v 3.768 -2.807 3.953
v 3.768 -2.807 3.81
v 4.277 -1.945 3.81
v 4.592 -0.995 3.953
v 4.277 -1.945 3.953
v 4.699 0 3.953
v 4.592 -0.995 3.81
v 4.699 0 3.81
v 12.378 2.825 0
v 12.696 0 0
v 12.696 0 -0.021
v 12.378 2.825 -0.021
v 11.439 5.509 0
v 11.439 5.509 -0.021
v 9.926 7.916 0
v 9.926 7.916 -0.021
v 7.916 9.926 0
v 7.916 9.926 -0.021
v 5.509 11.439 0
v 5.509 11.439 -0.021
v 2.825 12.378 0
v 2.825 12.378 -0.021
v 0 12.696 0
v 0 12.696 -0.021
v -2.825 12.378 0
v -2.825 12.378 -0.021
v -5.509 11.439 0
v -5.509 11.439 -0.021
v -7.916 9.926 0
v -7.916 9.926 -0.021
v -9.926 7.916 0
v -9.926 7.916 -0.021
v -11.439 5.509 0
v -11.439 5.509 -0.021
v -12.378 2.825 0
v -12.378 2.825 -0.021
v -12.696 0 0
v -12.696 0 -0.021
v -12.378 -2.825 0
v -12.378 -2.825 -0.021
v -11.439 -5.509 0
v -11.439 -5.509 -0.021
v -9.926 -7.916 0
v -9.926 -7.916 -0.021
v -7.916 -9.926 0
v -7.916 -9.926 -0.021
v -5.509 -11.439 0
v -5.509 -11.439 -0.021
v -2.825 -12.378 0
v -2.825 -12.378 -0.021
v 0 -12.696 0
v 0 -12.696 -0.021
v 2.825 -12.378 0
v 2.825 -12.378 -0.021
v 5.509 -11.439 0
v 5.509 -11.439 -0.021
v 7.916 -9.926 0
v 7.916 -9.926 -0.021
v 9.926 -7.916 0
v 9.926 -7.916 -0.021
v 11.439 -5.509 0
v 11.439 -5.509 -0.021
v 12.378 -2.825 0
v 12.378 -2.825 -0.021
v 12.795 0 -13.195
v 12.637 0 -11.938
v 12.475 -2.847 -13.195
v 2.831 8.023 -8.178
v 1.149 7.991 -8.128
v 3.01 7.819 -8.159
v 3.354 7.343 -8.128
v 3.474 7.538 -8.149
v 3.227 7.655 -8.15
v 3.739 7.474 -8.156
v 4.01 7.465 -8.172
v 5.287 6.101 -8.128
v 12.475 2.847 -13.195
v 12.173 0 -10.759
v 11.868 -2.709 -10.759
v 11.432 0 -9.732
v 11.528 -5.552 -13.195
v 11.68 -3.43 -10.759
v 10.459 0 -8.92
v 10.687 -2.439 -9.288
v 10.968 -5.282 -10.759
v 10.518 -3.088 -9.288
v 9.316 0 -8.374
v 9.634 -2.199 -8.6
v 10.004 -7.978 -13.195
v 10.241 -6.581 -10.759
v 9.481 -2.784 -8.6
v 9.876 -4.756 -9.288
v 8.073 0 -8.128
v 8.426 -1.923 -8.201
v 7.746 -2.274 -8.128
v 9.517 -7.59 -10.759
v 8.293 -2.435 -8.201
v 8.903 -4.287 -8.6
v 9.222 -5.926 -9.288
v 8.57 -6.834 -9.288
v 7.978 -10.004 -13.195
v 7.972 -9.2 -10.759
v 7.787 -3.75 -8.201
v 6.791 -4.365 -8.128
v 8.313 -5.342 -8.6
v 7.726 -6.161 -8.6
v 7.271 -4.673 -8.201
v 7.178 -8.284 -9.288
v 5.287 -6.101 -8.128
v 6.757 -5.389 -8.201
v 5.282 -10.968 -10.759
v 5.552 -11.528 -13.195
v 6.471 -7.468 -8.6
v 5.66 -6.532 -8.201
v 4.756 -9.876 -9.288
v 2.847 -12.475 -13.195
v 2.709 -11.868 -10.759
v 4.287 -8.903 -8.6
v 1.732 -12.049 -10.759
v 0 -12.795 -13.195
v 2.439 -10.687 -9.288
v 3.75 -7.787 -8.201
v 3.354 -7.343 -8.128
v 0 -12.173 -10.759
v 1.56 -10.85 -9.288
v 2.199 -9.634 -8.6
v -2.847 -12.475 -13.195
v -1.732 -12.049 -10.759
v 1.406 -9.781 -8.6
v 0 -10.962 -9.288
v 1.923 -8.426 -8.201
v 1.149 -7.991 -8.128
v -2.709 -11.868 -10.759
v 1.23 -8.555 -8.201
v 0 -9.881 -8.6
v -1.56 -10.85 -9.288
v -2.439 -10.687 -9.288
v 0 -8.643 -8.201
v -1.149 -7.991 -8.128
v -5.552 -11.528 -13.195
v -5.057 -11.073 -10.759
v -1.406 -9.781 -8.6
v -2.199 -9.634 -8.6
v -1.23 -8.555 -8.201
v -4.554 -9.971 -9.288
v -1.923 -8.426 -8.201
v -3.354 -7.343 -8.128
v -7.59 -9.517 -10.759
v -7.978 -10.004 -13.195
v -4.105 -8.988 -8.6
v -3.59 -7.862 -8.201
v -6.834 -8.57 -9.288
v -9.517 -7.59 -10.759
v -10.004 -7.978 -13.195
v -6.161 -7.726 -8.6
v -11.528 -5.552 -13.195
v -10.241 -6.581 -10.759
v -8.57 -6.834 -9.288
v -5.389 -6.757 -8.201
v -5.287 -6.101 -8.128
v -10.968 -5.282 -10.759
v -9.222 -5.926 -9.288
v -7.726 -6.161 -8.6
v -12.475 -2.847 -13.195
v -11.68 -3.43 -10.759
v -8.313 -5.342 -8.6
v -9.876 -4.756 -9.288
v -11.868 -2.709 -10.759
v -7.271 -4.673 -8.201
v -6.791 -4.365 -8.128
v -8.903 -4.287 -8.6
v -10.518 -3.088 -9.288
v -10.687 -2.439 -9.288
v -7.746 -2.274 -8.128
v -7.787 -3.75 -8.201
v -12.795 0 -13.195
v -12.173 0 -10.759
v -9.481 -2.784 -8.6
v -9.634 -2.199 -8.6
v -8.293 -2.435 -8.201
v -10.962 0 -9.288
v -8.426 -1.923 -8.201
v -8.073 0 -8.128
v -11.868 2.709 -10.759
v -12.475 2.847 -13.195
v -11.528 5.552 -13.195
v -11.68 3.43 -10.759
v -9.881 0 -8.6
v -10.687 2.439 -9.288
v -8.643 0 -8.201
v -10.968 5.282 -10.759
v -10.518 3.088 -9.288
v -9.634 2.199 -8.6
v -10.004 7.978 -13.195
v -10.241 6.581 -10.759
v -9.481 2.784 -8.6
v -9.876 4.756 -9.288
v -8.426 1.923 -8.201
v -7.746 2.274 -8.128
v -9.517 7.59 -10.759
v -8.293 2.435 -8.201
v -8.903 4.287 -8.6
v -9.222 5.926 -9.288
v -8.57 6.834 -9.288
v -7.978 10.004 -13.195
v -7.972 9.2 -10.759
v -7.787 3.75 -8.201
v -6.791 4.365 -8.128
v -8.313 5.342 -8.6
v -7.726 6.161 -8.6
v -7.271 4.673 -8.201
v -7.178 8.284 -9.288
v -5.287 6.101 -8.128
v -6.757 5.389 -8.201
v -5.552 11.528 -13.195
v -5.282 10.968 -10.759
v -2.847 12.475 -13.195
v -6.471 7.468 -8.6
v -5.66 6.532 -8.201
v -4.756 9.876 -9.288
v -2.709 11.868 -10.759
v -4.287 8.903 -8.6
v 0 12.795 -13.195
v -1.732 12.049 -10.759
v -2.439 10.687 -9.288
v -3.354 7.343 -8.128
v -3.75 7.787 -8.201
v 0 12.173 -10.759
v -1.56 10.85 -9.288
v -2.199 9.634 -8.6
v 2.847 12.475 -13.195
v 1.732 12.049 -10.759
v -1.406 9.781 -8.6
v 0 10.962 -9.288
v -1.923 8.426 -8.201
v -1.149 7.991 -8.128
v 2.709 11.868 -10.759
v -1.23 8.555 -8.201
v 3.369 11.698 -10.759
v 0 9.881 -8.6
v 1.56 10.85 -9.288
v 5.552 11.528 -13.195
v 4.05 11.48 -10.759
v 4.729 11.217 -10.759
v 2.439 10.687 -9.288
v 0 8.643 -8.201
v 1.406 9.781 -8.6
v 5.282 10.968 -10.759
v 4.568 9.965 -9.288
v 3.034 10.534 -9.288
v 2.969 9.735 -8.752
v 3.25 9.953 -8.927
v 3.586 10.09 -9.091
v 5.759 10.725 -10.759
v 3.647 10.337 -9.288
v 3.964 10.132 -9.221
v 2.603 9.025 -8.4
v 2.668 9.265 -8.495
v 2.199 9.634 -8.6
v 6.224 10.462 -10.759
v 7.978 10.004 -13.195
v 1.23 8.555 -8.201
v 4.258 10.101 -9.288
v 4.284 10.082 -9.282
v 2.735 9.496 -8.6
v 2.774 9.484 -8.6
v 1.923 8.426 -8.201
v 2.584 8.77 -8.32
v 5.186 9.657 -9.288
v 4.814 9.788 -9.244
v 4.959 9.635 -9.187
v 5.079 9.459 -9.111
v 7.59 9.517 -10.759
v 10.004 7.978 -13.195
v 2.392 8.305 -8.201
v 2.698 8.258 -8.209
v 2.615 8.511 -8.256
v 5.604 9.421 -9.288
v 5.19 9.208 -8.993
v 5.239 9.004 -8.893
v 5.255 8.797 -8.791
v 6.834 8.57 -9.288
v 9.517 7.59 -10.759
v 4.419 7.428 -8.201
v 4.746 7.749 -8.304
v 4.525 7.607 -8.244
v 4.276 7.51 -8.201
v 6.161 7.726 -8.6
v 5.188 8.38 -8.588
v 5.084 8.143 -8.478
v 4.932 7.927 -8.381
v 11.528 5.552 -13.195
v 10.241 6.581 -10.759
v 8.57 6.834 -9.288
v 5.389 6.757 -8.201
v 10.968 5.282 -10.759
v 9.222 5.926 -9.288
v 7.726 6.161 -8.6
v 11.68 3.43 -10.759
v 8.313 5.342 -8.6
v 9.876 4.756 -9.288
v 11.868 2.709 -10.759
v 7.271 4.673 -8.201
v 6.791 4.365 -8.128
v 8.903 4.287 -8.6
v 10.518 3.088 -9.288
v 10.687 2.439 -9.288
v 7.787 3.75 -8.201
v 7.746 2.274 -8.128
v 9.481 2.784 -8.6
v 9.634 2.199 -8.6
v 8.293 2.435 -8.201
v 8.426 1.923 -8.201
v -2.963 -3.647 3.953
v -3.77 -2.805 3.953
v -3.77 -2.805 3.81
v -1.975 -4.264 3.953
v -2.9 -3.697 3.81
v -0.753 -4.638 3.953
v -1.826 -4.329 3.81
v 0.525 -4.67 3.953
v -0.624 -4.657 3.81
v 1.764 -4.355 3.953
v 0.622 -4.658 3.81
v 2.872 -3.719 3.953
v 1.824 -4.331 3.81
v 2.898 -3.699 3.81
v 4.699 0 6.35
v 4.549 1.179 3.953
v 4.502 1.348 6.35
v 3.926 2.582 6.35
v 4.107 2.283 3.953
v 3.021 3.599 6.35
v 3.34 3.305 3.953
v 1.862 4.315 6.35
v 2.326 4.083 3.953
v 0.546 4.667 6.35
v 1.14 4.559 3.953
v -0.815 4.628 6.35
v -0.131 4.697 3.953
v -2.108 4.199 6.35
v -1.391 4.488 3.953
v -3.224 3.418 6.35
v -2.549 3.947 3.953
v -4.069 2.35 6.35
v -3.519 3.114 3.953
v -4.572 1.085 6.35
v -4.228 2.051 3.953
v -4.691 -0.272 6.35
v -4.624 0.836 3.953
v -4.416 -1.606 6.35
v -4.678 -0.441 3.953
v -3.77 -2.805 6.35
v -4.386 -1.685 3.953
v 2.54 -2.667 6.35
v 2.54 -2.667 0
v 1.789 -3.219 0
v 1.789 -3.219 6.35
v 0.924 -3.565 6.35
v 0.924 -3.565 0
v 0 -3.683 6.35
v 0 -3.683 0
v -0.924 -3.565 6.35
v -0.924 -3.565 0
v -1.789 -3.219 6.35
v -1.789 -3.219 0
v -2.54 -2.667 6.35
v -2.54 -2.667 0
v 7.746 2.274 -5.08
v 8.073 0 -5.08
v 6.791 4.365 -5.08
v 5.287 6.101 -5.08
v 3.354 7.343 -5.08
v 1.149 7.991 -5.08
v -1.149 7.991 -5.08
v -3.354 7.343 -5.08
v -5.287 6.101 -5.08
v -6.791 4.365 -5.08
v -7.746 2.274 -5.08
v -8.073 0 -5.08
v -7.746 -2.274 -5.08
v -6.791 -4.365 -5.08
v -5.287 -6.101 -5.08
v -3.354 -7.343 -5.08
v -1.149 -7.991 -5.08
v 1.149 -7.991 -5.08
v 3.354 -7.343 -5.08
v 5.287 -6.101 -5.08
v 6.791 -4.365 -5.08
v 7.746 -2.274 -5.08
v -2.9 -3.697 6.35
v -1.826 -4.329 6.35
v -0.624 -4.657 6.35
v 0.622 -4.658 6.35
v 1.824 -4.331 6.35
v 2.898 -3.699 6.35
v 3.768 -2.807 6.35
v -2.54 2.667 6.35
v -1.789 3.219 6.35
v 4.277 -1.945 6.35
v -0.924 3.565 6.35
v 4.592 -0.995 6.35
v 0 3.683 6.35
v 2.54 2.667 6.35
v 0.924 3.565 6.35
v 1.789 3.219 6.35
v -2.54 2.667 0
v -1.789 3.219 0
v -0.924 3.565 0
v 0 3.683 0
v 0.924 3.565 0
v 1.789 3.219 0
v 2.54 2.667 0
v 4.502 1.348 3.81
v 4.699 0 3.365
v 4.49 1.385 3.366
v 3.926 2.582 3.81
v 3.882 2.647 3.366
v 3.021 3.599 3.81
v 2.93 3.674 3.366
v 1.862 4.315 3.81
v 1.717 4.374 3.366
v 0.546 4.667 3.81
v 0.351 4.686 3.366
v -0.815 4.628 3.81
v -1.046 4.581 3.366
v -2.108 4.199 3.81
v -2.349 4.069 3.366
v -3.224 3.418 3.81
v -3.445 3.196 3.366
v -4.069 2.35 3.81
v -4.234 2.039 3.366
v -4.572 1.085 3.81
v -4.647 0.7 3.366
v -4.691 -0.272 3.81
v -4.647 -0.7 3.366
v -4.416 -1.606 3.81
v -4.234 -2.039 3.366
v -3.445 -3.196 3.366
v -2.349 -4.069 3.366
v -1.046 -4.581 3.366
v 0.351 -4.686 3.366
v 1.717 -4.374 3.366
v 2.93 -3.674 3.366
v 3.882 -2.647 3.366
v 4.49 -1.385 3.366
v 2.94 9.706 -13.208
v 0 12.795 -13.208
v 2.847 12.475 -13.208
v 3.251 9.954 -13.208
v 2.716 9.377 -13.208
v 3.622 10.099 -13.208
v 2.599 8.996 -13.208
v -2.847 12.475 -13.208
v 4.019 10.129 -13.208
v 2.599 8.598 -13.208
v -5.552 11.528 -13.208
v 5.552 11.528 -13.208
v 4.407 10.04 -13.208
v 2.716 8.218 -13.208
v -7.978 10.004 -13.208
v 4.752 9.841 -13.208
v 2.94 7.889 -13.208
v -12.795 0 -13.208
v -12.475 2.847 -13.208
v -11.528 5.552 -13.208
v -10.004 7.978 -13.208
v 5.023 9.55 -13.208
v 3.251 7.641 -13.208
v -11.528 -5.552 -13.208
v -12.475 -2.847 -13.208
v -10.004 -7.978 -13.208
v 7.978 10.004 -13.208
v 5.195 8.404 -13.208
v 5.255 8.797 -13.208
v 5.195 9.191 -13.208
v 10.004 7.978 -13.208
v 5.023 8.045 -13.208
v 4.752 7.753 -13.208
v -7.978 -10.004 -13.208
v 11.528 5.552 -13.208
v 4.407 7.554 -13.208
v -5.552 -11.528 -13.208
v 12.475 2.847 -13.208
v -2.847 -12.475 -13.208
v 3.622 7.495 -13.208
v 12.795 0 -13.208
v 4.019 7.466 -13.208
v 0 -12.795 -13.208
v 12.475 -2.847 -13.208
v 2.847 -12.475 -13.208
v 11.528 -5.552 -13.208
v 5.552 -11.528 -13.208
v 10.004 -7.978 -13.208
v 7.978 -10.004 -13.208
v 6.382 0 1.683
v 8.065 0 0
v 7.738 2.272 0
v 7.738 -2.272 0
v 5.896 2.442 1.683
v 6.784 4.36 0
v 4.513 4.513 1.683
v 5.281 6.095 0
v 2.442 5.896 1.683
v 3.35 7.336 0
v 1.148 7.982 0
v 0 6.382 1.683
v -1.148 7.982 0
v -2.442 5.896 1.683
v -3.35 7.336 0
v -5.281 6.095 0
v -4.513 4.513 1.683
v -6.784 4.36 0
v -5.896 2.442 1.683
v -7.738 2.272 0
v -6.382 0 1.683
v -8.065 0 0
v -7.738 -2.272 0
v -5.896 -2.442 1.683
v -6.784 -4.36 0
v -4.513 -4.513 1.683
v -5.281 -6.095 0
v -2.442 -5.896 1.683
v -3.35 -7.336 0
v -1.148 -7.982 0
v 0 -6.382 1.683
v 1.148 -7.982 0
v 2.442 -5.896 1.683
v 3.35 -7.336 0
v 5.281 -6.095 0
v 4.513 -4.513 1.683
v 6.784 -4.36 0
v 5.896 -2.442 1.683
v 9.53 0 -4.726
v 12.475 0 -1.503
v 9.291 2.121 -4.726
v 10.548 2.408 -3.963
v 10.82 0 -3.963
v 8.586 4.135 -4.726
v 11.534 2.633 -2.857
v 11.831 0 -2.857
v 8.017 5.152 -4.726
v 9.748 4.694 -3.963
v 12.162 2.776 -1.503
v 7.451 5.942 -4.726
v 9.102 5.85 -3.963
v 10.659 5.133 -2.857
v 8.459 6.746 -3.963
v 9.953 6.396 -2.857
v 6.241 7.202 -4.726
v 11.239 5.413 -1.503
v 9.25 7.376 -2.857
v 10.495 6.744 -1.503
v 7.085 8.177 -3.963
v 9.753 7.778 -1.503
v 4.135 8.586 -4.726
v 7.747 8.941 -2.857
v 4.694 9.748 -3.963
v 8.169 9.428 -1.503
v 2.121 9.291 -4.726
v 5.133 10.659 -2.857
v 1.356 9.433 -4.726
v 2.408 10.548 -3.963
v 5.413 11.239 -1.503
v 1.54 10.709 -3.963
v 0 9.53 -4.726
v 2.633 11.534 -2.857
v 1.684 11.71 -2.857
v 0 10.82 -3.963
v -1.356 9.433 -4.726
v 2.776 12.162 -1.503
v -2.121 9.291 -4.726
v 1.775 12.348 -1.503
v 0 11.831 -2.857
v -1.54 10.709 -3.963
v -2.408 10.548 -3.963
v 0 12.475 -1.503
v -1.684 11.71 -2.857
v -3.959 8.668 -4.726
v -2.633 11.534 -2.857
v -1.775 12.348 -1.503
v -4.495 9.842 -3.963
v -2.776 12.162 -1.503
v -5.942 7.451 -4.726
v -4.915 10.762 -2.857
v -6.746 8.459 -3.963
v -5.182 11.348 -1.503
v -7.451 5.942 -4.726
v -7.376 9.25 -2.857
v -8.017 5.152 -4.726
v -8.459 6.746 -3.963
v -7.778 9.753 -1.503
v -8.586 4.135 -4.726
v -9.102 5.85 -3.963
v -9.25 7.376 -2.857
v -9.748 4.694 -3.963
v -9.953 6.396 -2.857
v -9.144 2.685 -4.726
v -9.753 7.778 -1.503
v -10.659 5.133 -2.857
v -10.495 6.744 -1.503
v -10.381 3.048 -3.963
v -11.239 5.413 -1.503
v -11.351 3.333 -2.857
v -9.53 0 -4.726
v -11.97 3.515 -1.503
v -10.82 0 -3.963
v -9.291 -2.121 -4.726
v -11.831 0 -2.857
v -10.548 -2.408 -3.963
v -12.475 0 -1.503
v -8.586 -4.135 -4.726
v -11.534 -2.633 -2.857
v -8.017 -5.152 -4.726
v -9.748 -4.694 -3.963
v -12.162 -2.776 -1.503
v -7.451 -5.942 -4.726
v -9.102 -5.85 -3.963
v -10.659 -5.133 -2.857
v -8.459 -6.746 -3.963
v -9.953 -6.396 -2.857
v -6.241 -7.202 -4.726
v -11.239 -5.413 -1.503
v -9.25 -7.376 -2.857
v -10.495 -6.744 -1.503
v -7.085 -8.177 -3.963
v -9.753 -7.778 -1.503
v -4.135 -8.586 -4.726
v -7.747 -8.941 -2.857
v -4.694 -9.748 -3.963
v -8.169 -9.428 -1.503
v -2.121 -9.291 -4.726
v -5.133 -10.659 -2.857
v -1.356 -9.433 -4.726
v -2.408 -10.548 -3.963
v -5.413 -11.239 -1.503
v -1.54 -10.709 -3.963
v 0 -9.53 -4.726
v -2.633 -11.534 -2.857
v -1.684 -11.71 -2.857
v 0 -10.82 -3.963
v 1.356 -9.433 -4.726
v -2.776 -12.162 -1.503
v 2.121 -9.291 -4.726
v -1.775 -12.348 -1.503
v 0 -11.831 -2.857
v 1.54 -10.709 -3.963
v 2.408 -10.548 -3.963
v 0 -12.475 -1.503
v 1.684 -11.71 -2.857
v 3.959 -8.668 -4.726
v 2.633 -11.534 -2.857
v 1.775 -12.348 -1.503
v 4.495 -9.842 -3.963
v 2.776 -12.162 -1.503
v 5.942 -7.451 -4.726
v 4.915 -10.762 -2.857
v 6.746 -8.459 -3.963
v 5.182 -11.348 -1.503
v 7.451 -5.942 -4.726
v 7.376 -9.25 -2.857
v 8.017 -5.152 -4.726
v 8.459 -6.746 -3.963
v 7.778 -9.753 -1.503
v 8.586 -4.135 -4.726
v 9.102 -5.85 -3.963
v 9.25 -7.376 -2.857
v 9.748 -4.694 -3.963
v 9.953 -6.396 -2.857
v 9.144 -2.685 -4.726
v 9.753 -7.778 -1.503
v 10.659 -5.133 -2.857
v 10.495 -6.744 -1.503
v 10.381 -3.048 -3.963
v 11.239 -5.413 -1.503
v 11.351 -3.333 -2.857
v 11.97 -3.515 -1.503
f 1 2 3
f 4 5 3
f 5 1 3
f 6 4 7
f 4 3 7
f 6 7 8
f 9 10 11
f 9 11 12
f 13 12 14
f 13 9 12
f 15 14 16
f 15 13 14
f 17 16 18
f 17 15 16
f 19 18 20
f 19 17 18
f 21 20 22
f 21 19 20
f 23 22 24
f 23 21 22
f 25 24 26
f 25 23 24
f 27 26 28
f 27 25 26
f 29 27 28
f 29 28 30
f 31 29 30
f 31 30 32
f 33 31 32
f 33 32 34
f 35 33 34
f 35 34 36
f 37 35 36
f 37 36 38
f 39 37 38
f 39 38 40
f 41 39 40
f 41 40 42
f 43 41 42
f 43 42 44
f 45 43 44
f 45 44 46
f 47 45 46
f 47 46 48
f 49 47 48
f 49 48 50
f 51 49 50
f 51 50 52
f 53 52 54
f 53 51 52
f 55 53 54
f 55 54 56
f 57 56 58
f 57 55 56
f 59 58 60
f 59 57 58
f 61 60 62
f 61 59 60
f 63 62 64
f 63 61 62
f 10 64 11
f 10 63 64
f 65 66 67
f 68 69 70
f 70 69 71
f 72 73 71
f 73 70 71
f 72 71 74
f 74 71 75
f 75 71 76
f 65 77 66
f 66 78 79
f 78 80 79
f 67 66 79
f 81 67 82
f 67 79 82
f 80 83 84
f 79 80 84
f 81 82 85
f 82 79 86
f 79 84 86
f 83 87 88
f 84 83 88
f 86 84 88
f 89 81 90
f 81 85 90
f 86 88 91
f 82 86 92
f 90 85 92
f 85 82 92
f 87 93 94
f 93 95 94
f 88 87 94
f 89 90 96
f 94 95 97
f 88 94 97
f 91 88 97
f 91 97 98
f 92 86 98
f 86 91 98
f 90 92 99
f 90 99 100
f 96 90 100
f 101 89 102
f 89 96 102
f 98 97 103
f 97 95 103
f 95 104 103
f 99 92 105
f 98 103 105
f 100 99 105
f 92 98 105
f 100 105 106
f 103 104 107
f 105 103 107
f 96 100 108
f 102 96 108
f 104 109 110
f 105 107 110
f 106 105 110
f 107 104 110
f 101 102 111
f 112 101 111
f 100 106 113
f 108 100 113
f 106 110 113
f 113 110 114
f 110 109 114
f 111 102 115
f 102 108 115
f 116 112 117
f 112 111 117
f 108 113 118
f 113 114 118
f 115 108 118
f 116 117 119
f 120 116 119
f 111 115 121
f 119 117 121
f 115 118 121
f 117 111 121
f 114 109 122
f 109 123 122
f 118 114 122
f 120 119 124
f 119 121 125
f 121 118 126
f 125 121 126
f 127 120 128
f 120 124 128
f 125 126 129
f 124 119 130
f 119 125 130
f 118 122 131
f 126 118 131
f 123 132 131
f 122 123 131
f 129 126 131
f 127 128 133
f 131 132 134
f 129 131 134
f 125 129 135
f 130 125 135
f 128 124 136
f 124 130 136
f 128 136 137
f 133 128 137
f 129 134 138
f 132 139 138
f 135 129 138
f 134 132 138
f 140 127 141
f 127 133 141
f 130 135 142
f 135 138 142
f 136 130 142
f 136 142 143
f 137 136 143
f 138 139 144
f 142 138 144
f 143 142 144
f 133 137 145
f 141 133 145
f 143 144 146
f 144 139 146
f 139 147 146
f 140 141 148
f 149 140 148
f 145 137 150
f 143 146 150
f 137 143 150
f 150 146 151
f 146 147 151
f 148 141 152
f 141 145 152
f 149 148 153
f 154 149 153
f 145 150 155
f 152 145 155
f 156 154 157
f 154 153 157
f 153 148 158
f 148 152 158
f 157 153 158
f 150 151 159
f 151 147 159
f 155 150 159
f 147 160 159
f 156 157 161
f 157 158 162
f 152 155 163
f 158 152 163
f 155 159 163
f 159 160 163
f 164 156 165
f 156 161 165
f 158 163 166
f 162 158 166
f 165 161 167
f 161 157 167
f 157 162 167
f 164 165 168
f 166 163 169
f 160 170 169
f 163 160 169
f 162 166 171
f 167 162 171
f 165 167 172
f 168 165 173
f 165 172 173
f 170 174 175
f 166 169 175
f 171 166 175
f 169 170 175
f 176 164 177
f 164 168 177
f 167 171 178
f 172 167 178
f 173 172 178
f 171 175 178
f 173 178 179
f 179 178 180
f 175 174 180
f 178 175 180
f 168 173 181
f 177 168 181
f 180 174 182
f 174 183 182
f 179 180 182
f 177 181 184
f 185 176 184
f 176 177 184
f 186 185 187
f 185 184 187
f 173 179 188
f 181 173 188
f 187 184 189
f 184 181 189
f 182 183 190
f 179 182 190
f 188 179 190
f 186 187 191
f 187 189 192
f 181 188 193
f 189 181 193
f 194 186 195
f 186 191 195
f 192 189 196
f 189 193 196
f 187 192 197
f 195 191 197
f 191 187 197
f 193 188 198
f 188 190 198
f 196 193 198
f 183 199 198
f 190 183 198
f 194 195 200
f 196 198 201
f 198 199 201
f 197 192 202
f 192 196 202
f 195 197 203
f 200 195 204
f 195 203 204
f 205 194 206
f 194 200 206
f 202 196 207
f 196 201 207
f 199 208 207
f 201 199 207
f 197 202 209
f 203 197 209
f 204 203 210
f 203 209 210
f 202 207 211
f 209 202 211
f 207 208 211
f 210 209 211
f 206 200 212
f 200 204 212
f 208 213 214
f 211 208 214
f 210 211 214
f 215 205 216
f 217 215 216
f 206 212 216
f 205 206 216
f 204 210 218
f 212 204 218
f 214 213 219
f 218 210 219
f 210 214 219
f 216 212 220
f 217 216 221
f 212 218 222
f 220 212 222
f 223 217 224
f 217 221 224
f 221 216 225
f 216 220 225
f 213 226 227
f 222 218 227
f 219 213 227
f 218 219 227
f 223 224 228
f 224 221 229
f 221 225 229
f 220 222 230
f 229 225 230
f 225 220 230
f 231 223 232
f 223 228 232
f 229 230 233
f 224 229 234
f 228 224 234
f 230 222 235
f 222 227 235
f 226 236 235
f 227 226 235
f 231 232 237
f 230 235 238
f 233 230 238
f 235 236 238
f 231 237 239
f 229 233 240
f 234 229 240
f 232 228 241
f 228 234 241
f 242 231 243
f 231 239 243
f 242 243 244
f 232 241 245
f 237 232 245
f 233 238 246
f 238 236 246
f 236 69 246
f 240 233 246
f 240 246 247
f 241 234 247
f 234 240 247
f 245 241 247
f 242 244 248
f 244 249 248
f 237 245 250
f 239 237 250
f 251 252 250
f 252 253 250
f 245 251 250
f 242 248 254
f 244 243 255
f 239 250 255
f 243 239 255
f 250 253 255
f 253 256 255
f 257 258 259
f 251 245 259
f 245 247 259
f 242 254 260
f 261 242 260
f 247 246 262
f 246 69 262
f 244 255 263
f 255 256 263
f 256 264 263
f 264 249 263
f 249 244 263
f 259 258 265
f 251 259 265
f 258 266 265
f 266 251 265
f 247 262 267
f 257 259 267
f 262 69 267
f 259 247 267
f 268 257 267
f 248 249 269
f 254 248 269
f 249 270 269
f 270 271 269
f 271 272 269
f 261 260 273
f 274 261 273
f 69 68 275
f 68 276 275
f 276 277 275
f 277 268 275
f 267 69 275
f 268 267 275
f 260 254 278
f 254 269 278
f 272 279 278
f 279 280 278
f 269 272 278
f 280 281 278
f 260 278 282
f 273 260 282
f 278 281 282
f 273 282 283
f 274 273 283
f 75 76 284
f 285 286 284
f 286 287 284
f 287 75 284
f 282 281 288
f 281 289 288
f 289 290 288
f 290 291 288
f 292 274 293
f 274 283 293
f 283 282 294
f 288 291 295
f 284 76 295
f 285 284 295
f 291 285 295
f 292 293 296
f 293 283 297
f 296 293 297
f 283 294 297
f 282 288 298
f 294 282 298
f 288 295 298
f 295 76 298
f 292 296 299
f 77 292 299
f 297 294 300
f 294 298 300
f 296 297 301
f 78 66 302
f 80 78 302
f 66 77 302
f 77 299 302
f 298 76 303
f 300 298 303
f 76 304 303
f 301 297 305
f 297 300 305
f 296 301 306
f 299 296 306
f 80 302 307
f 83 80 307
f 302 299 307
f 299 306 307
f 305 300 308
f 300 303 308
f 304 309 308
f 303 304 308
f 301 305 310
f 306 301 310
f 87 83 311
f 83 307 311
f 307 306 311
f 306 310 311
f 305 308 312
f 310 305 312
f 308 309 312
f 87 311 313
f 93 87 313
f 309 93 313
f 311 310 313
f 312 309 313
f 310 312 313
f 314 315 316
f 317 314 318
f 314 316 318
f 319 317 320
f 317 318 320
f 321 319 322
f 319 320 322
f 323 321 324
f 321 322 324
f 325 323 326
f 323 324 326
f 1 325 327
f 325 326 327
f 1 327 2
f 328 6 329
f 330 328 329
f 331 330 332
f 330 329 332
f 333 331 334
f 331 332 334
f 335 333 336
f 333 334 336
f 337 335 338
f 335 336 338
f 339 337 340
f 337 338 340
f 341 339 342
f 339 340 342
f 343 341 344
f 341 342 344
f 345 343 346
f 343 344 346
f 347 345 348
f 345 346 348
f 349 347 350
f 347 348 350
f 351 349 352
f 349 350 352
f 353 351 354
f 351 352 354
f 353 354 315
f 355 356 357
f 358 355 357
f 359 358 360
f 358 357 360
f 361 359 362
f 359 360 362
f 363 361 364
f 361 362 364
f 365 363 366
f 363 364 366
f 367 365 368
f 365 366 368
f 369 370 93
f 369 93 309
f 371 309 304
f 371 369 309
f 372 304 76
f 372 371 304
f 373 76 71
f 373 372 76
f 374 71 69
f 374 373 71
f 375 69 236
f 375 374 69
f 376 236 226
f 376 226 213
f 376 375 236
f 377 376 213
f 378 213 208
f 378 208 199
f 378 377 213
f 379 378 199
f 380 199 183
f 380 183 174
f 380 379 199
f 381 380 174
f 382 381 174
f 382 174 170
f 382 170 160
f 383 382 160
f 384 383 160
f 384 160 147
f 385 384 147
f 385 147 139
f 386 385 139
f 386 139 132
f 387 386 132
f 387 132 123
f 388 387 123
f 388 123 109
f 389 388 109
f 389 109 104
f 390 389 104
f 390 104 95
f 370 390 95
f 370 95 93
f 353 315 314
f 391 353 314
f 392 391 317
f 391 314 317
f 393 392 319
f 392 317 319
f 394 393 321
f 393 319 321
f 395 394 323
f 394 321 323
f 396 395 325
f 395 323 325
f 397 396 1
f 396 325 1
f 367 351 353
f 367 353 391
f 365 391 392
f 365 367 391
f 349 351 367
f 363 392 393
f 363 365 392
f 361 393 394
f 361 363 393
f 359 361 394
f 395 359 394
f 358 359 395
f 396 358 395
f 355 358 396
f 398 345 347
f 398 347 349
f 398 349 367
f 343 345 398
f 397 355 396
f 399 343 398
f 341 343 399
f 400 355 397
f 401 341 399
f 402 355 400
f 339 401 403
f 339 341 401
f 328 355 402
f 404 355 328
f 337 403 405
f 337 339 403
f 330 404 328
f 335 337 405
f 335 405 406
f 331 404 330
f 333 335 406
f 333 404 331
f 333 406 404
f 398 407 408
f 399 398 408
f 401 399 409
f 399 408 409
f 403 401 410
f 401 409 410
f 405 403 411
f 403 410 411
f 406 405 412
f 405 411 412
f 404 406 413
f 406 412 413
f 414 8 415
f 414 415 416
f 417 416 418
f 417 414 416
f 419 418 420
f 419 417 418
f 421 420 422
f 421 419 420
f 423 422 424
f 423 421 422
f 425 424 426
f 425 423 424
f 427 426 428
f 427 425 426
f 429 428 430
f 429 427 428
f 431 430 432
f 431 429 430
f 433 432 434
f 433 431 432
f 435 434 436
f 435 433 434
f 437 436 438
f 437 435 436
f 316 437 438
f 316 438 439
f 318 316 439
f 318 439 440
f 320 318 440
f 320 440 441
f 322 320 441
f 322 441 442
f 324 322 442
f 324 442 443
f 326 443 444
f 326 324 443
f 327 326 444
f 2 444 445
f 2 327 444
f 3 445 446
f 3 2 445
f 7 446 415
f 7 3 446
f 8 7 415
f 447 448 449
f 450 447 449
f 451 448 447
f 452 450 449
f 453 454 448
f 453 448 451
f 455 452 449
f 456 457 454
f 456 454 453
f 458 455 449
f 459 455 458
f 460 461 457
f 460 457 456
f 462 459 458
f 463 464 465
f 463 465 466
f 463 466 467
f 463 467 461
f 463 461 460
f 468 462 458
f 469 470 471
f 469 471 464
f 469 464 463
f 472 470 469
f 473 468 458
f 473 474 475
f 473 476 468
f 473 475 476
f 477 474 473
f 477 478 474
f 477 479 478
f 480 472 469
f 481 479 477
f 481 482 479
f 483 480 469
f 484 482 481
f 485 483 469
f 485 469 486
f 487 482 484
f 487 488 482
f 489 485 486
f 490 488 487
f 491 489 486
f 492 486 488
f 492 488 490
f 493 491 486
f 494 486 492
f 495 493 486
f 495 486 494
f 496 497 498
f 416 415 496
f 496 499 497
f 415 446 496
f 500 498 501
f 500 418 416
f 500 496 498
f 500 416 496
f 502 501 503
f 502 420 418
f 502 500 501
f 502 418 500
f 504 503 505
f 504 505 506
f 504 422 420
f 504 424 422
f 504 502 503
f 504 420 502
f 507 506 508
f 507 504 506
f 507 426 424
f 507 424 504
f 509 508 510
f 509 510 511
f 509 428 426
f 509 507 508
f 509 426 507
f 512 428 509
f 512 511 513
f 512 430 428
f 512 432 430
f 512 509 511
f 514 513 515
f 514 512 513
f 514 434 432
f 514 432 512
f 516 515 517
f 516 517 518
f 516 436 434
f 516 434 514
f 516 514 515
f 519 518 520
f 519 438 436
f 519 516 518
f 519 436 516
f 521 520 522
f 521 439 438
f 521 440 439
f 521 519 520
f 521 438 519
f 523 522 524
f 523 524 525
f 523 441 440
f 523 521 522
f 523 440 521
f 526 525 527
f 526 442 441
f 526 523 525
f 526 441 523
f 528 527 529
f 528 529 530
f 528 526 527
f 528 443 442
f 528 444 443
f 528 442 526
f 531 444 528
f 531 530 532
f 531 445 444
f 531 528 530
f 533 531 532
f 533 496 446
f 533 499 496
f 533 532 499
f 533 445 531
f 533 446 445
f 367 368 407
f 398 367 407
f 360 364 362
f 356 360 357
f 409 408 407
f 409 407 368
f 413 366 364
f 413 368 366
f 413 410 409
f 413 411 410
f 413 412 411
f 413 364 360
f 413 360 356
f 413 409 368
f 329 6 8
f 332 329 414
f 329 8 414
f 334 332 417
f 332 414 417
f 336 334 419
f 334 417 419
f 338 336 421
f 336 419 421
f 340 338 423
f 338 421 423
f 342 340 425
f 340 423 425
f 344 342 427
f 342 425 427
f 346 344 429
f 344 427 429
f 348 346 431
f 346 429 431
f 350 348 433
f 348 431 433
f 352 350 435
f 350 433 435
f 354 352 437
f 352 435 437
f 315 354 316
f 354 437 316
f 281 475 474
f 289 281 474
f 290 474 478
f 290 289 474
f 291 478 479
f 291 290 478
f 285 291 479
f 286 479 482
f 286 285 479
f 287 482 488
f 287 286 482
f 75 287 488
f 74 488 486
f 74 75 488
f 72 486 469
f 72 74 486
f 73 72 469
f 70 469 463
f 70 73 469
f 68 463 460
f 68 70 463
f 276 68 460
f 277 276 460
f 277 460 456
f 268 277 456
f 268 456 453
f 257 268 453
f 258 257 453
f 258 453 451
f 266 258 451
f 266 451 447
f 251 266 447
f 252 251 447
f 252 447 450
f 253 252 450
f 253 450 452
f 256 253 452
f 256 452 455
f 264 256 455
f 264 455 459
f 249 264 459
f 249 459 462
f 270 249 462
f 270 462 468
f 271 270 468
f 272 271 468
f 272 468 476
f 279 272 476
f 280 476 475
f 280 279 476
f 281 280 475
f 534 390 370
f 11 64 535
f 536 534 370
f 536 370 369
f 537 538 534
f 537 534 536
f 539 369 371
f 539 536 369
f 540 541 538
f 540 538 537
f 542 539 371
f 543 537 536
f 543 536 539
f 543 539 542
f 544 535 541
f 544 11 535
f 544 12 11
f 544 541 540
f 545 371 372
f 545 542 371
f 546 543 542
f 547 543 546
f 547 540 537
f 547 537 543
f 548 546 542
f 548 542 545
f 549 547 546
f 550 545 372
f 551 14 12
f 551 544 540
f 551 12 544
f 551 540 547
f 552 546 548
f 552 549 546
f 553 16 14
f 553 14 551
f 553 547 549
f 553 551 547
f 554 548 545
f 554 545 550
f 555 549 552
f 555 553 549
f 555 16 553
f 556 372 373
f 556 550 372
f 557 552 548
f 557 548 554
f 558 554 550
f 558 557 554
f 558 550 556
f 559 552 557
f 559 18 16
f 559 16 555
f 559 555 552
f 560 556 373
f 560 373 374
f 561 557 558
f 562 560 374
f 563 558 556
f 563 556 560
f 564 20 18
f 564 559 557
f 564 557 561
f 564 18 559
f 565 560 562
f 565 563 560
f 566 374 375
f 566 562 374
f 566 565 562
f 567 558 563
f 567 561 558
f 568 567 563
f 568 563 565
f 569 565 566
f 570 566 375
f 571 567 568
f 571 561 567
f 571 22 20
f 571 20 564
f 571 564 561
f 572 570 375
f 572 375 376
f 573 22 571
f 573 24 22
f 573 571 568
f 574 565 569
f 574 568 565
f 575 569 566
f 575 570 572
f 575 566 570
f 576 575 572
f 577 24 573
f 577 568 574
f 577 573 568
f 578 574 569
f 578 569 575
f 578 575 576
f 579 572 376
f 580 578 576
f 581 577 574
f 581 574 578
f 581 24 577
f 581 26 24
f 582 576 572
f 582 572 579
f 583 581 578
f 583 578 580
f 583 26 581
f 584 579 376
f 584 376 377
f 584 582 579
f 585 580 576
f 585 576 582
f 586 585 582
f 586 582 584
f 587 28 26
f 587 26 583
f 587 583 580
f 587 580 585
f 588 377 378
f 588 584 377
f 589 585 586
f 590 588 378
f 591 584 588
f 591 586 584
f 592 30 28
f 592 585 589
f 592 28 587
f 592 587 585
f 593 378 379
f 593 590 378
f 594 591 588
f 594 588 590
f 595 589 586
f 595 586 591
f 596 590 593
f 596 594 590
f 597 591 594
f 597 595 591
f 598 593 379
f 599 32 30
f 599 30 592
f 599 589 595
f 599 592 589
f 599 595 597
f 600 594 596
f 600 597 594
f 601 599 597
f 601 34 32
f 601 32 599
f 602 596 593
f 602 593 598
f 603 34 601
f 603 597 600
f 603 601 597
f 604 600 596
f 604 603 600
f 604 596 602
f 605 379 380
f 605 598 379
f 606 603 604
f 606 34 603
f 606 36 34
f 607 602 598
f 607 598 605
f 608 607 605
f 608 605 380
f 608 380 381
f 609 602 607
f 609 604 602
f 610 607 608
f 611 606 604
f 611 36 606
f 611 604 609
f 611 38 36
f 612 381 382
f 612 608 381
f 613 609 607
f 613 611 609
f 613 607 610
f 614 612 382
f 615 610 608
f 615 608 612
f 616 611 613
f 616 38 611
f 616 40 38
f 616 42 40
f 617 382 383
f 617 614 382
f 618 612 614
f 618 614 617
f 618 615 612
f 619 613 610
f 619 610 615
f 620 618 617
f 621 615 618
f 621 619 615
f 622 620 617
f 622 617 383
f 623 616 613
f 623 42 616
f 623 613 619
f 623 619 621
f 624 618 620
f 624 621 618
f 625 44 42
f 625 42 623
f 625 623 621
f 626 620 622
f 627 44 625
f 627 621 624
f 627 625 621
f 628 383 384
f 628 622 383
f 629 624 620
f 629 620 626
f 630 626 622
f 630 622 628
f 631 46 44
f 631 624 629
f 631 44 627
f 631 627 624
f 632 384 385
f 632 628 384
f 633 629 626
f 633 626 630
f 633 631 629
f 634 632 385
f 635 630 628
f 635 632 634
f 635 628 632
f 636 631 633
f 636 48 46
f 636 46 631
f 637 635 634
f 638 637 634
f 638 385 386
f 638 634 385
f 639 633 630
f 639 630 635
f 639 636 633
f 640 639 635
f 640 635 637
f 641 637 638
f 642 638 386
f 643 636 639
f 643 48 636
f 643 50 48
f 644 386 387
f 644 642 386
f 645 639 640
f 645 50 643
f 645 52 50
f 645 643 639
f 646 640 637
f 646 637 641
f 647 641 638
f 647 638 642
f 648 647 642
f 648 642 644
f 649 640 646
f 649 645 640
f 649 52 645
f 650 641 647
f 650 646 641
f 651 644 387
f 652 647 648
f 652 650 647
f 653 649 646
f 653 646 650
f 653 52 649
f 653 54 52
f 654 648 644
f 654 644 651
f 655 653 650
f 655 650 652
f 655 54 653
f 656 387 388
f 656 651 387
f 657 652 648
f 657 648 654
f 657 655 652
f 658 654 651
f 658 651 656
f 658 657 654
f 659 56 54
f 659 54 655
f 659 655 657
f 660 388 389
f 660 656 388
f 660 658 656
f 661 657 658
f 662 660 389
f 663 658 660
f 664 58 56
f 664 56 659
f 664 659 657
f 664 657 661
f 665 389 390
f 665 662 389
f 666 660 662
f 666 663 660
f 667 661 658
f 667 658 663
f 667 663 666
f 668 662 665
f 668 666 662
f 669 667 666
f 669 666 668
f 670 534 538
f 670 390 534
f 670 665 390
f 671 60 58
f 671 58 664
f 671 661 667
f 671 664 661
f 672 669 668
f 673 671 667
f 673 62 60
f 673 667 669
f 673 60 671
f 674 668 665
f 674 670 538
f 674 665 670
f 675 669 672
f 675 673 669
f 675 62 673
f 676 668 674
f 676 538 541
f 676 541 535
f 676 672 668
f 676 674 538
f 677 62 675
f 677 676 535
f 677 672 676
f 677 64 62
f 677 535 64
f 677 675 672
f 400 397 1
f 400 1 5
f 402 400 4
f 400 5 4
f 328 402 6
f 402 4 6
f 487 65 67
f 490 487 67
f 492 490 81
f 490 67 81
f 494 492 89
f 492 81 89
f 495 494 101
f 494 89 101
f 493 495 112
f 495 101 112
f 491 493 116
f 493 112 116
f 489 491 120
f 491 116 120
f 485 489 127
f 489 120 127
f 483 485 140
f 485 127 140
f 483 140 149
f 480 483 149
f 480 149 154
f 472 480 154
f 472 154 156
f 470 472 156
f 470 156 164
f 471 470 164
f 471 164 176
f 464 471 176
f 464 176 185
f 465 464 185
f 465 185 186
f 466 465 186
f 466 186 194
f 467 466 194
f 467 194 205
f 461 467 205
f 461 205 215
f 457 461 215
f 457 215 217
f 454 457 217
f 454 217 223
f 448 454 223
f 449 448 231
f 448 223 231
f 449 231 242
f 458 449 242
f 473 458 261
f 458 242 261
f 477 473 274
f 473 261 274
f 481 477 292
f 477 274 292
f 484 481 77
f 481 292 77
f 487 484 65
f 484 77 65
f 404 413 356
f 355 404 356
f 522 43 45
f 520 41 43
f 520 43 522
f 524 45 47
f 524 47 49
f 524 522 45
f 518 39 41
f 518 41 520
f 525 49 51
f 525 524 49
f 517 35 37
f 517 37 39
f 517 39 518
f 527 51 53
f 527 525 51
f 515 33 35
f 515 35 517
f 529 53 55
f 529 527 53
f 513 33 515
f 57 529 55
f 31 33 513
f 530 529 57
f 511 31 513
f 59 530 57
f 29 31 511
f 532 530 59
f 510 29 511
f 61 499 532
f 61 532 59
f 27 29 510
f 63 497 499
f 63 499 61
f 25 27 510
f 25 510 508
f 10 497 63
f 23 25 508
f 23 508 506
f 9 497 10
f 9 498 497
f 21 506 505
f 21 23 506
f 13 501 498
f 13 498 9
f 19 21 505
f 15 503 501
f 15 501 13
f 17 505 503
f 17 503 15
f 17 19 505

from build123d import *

# Parameters (mm, degrees)
F1_DEPTH    = 6.35
F2_R        = 12.6960047963
F2_R_2      = 8.0729751922
F3_DEPTH    = 5.08
F4_DEPTH    = 8.128
F5_R        = 12.7953112481
F5_R_2      = 1.3354653725
F5_R_3      = 8.0729751922
F6_DEPTH    = 5.08
F0_R        = 8.0645
F8_DEPTH    = 3.81
F9_S6_R     = 4.699
F9_T7_DEPTH = 39


# Not quite as in the source:
# - a fillet or chamfer that OpenCascade refuses, or shapes differently, is made with other operations: its cross-section is extruded or revolved along the edge and cut away or added


with BuildPart() as f1:
    # F0 (on Top) → F1 (new body)
    with BuildSketch(Plane.XY):
        with BuildLine():
            Line((-2.54, -2.8050532779), (-3.7699173874, -2.8050532779))
            ThreePointArc((-3.7699173874, -2.8050532779), (-0.0014195763, -4.6989997856), (3.7682218762, -2.8073305634))
            Line((3.7682218762, -2.8073305634), (2.54, -2.8073305634))
            Line((2.54, -2.8073305634), (2.54, -2.667))
            ThreePointArc((2.54, -2.667), (0, -3.683), (-2.54, -2.667))
            Line((-2.54, -2.667), (-2.54, -2.8050532779))
        make_face()
        with BuildLine():
            Line((2.54, 0), (2.54, -2.667))
            ThreePointArc((2.54, -2.667), (3.3852111456, -1.4508047767), (3.683, 0))
            ThreePointArc((3.683, 0), (3.3852111456, 1.4508047767), (2.54, 2.667))
            Line((2.54, 2.667), (2.54, 0))
        make_face()
        with BuildLine():
            Line((2.54, -2.8073305634), (3.7682218762, -2.8073305634))
            Line((3.7682218762, -2.8073305634), (3.7682218762, 2.667))
            Line((3.7682218762, 2.667), (2.54, 2.667))
            ThreePointArc((2.54, 2.667), (3.3852111456, 1.4508047767), (3.683, 0))
            ThreePointArc((3.683, 0), (3.3852111456, -1.4508047767), (2.54, -2.667))
            Line((2.54, -2.667), (2.54, -2.8073305634))
        make_face()
        with BuildLine():
            ThreePointArc((3.7682218762, -2.8073305634), (4.460239657, -1.4788046531), (4.699, 0))
            ThreePointArc((4.699, 0), (-1.4774571392, 4.460686203), (-3.7699173874, -2.8050532779))
            Line((-3.7699173874, -2.8050532779), (-3.7699173874, 2.667))
            Line((-3.7699173874, 2.667), (-2.54, 2.667))
            ThreePointArc((-2.54, 2.667), (0, 3.683), (2.54, 2.667))
            Line((2.54, 2.667), (3.7682218762, 2.667))
            Line((3.7682218762, 2.667), (3.7682218762, -2.8073305634))
        make_face()
        with BuildLine():
            Line((-3.7699173874, 2.667), (-3.7699173874, -2.8050532779))
            Line((-3.7699173874, -2.8050532779), (-2.54, -2.8050532779))
            Line((-2.54, -2.8050532779), (-2.54, -2.667))
            ThreePointArc((-2.54, -2.667), (-3.683, 0), (-2.54, 2.667))
            Line((-2.54, 2.667), (-3.7699173874, 2.667))
        make_face()
        with BuildLine():
            ThreePointArc((-2.54, 2.667), (-3.683, 0), (-2.54, -2.667))
            Line((-2.54, -2.667), (-2.54, 0))
            Line((-2.54, 0), (-2.54, 2.667))
        make_face()
    extrude(amount=F1_DEPTH)



with BuildPart() as f3:
    # F2 (on Top) → F3 (new body)
    with BuildSketch(Plane.XY):
        Circle(F2_R)
        Circle(F2_R_2, mode=Mode.SUBTRACT)
    extrude(amount=-F3_DEPTH)


with BuildPart() as f1_1:
    add(f1.part)

    add(f3.part)  # F4 merges F3
    # F2 (on Top) → F4 (join)
    with BuildSketch(Plane.XY):
        Circle(F2_R_2)
    extrude(amount=-F4_DEPTH)

    # F5 (on face) → F6 (join)
    with BuildSketch(Plane(origin=(0, 0, -8.128), x_dir=(1, 0, 0), z_dir=(0, 0, -1))):
        Circle(F5_R)
        with Locations((3.9191520773, -8.7972320383)):
            Circle(F5_R_2, mode=Mode.SUBTRACT)
        Circle(F5_R_3, mode=Mode.SUBTRACT)
        Circle(F5_R_3)
    extrude(amount=F6_DEPTH)

    # F7: fillet of radius 5.08 on 2 edges, made by hand

    # F7_s1 → F7_t2 (revolve, cut)
    with BuildSketch(Plane.XZ):
        with BuildLine():
            ThreePointArc((12.7953112481, -13.1953934624), (11.4317162877, -9.7320520727), (8.0729751922, -8.128))
            Line((8.0729751922, -8.128), (12.7953112481, -8.128))
            Line((12.7953112481, -8.128), (12.7953112481, -13.1953934624))
        make_face()
    revolve(axis=Axis((0, 0, -8.128), (0, 0, -1)), mode=Mode.SUBTRACT)

    # F7_s3 → F7_t4 (revolve, cut)
    with BuildSketch(Plane.XZ):
        with BuildLine():
            ThreePointArc((8.0729751922, -5.08), (11.366192099, -3.4473275256), (12.6960047963, -0.0205950886))
            Line((12.6960047963, -0.0205950886), (12.6960047963, -5.08))
            Line((12.6960047963, -5.08), (8.0729751922, -5.08))
        make_face()
    revolve(axis=Axis((0, 0, -5.08), (0, 0, 1)), mode=Mode.SUBTRACT)

    # F0 (on Top) → F8 (join)
    with BuildSketch(Plane.XY):
        Circle(F0_R)
        with BuildLine():
            ThreePointArc((-3.7699173874, -2.8050532779), (-1.4774571392, 4.460686203), (4.699, 0))
            ThreePointArc((4.699, 0), (4.460239657, -1.4788046531), (3.7682218762, -2.8073305634))
            ThreePointArc((3.7682218762, -2.8073305634), (-0.0014195763, -4.6989997856), (-3.7699173874, -2.8050532779))
        make_face(mode=Mode.SUBTRACT)
    extrude(amount=F8_DEPTH)

    # F9: chamfer of 3.81 on 1 edges, made by hand


with BuildPart() as f9_tool2:
    # F9_s3 → F9_t4 (revolve)
    with BuildSketch(Plane.XZ):
        with BuildLine():
            Line((8.1722630735, -0.1077630735), (4.1467369265, 3.9177630735))
            Line((4.1467369265, 3.9177630735), (4.1467369265, 3.9939630735))
            ThreePointArc((4.1467369265, 3.9939630735), (6.1056184633, 3.8862), (8.0645, 3.8862))
            Line((8.0645, 3.8862), (8.1407, 3.81))
            ThreePointArc((8.1407, 3.81), (8.1407, 1.8511184633), (8.2484630735, -0.1077630735))
            Line((8.2484630735, -0.1077630735), (8.1722630735, -0.1077630735))
        make_face()
    revolve(axis=Axis((0, 0, 3.81), (0, 0, 1)))

    split(bisect_by=Plane.XY, keep=Keep.TOP)

    # F9_s6 → F9_t7 (cut, symmetric)
    with BuildSketch(Plane.XY.offset(2.8)):
        Circle(F9_S6_R)
    extrude(amount=F9_T7_DEPTH, both=True, mode=Mode.SUBTRACT)


with BuildPart() as f1_2:
    add(f1_1.part)

    # F9_t1: cut F9_tool2
    add(f9_tool2.part, mode=Mode.SUBTRACT)


solid = f1_2.part
